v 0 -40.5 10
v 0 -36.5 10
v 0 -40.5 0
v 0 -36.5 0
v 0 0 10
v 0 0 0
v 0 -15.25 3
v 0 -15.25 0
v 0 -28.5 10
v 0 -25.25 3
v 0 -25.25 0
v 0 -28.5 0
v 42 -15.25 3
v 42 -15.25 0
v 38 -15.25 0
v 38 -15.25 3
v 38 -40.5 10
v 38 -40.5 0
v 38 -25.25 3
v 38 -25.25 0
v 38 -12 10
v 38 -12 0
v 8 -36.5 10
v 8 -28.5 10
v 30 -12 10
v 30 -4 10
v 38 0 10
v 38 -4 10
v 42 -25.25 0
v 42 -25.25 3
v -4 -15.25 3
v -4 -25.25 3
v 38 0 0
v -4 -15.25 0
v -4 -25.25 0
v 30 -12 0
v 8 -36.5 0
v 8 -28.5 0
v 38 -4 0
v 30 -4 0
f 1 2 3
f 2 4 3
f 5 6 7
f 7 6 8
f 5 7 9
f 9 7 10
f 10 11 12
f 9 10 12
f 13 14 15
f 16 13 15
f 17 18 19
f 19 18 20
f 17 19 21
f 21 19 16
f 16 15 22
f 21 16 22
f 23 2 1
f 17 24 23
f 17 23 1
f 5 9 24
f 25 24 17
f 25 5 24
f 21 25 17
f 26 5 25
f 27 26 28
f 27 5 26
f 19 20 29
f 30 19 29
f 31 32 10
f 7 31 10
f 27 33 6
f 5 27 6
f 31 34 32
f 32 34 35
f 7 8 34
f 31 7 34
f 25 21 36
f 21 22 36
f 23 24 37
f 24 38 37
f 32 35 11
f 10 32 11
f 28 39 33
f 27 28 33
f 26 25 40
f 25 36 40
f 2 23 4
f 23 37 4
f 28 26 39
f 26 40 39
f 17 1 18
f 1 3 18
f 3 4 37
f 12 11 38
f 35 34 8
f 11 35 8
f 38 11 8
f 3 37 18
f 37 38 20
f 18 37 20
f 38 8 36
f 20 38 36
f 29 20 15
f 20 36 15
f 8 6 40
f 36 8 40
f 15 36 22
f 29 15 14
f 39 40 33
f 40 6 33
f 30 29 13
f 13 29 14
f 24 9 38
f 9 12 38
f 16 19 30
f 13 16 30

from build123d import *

# Parameters (mm, degrees)
EXTRUDE_1_DEPTH = 3
EXTRUDE_2_DEPTH = 7


with BuildPart() as part:
    # 草图1 → 凸台-拉伸1 (new body)
    with BuildSketch(Plane.XY):
        Polygon((0, 0), (0, -15.25), (-4, -15.25), (-4, -25.25), (0, -25.25), (0, -28.5), (8, -28.5), (8, -36.5), (0, -36.5), (0, -40.5), (38, -40.5), (38, -25.25), (42, -25.25), (42, -15.25), (38, -15.25), (38, -12), (30, -12), (30, -4), (38, -4), (38, 0), align=None)
    extrude(amount=EXTRUDE_1_DEPTH)

    # 草图2 → 凸台-拉伸2 (add)
    with BuildSketch(Plane.XY.offset(3)):
        Polygon((0, 0), (0, -28.5), (8, -28.5), (8, -36.5), (0, -36.5), (0, -40.5), (38, -40.5), (38, -12), (30, -12), (30, -4), (38, -4), (38, 0), align=None)
    extrude(amount=EXTRUDE_2_DEPTH)


solid = part.part
